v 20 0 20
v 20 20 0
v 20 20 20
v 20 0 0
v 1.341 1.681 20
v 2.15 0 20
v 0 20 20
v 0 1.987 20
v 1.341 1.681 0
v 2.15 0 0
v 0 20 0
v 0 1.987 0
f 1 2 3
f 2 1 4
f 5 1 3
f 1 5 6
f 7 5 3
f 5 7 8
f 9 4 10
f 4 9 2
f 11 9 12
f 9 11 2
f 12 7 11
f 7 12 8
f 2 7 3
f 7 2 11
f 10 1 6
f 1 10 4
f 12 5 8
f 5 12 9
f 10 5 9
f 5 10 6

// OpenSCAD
parafuso_m4 = 4.3;

difference() {

    cube(20);

    cylinder(
        h=30,
        d=parafuso_m4
    );

}
